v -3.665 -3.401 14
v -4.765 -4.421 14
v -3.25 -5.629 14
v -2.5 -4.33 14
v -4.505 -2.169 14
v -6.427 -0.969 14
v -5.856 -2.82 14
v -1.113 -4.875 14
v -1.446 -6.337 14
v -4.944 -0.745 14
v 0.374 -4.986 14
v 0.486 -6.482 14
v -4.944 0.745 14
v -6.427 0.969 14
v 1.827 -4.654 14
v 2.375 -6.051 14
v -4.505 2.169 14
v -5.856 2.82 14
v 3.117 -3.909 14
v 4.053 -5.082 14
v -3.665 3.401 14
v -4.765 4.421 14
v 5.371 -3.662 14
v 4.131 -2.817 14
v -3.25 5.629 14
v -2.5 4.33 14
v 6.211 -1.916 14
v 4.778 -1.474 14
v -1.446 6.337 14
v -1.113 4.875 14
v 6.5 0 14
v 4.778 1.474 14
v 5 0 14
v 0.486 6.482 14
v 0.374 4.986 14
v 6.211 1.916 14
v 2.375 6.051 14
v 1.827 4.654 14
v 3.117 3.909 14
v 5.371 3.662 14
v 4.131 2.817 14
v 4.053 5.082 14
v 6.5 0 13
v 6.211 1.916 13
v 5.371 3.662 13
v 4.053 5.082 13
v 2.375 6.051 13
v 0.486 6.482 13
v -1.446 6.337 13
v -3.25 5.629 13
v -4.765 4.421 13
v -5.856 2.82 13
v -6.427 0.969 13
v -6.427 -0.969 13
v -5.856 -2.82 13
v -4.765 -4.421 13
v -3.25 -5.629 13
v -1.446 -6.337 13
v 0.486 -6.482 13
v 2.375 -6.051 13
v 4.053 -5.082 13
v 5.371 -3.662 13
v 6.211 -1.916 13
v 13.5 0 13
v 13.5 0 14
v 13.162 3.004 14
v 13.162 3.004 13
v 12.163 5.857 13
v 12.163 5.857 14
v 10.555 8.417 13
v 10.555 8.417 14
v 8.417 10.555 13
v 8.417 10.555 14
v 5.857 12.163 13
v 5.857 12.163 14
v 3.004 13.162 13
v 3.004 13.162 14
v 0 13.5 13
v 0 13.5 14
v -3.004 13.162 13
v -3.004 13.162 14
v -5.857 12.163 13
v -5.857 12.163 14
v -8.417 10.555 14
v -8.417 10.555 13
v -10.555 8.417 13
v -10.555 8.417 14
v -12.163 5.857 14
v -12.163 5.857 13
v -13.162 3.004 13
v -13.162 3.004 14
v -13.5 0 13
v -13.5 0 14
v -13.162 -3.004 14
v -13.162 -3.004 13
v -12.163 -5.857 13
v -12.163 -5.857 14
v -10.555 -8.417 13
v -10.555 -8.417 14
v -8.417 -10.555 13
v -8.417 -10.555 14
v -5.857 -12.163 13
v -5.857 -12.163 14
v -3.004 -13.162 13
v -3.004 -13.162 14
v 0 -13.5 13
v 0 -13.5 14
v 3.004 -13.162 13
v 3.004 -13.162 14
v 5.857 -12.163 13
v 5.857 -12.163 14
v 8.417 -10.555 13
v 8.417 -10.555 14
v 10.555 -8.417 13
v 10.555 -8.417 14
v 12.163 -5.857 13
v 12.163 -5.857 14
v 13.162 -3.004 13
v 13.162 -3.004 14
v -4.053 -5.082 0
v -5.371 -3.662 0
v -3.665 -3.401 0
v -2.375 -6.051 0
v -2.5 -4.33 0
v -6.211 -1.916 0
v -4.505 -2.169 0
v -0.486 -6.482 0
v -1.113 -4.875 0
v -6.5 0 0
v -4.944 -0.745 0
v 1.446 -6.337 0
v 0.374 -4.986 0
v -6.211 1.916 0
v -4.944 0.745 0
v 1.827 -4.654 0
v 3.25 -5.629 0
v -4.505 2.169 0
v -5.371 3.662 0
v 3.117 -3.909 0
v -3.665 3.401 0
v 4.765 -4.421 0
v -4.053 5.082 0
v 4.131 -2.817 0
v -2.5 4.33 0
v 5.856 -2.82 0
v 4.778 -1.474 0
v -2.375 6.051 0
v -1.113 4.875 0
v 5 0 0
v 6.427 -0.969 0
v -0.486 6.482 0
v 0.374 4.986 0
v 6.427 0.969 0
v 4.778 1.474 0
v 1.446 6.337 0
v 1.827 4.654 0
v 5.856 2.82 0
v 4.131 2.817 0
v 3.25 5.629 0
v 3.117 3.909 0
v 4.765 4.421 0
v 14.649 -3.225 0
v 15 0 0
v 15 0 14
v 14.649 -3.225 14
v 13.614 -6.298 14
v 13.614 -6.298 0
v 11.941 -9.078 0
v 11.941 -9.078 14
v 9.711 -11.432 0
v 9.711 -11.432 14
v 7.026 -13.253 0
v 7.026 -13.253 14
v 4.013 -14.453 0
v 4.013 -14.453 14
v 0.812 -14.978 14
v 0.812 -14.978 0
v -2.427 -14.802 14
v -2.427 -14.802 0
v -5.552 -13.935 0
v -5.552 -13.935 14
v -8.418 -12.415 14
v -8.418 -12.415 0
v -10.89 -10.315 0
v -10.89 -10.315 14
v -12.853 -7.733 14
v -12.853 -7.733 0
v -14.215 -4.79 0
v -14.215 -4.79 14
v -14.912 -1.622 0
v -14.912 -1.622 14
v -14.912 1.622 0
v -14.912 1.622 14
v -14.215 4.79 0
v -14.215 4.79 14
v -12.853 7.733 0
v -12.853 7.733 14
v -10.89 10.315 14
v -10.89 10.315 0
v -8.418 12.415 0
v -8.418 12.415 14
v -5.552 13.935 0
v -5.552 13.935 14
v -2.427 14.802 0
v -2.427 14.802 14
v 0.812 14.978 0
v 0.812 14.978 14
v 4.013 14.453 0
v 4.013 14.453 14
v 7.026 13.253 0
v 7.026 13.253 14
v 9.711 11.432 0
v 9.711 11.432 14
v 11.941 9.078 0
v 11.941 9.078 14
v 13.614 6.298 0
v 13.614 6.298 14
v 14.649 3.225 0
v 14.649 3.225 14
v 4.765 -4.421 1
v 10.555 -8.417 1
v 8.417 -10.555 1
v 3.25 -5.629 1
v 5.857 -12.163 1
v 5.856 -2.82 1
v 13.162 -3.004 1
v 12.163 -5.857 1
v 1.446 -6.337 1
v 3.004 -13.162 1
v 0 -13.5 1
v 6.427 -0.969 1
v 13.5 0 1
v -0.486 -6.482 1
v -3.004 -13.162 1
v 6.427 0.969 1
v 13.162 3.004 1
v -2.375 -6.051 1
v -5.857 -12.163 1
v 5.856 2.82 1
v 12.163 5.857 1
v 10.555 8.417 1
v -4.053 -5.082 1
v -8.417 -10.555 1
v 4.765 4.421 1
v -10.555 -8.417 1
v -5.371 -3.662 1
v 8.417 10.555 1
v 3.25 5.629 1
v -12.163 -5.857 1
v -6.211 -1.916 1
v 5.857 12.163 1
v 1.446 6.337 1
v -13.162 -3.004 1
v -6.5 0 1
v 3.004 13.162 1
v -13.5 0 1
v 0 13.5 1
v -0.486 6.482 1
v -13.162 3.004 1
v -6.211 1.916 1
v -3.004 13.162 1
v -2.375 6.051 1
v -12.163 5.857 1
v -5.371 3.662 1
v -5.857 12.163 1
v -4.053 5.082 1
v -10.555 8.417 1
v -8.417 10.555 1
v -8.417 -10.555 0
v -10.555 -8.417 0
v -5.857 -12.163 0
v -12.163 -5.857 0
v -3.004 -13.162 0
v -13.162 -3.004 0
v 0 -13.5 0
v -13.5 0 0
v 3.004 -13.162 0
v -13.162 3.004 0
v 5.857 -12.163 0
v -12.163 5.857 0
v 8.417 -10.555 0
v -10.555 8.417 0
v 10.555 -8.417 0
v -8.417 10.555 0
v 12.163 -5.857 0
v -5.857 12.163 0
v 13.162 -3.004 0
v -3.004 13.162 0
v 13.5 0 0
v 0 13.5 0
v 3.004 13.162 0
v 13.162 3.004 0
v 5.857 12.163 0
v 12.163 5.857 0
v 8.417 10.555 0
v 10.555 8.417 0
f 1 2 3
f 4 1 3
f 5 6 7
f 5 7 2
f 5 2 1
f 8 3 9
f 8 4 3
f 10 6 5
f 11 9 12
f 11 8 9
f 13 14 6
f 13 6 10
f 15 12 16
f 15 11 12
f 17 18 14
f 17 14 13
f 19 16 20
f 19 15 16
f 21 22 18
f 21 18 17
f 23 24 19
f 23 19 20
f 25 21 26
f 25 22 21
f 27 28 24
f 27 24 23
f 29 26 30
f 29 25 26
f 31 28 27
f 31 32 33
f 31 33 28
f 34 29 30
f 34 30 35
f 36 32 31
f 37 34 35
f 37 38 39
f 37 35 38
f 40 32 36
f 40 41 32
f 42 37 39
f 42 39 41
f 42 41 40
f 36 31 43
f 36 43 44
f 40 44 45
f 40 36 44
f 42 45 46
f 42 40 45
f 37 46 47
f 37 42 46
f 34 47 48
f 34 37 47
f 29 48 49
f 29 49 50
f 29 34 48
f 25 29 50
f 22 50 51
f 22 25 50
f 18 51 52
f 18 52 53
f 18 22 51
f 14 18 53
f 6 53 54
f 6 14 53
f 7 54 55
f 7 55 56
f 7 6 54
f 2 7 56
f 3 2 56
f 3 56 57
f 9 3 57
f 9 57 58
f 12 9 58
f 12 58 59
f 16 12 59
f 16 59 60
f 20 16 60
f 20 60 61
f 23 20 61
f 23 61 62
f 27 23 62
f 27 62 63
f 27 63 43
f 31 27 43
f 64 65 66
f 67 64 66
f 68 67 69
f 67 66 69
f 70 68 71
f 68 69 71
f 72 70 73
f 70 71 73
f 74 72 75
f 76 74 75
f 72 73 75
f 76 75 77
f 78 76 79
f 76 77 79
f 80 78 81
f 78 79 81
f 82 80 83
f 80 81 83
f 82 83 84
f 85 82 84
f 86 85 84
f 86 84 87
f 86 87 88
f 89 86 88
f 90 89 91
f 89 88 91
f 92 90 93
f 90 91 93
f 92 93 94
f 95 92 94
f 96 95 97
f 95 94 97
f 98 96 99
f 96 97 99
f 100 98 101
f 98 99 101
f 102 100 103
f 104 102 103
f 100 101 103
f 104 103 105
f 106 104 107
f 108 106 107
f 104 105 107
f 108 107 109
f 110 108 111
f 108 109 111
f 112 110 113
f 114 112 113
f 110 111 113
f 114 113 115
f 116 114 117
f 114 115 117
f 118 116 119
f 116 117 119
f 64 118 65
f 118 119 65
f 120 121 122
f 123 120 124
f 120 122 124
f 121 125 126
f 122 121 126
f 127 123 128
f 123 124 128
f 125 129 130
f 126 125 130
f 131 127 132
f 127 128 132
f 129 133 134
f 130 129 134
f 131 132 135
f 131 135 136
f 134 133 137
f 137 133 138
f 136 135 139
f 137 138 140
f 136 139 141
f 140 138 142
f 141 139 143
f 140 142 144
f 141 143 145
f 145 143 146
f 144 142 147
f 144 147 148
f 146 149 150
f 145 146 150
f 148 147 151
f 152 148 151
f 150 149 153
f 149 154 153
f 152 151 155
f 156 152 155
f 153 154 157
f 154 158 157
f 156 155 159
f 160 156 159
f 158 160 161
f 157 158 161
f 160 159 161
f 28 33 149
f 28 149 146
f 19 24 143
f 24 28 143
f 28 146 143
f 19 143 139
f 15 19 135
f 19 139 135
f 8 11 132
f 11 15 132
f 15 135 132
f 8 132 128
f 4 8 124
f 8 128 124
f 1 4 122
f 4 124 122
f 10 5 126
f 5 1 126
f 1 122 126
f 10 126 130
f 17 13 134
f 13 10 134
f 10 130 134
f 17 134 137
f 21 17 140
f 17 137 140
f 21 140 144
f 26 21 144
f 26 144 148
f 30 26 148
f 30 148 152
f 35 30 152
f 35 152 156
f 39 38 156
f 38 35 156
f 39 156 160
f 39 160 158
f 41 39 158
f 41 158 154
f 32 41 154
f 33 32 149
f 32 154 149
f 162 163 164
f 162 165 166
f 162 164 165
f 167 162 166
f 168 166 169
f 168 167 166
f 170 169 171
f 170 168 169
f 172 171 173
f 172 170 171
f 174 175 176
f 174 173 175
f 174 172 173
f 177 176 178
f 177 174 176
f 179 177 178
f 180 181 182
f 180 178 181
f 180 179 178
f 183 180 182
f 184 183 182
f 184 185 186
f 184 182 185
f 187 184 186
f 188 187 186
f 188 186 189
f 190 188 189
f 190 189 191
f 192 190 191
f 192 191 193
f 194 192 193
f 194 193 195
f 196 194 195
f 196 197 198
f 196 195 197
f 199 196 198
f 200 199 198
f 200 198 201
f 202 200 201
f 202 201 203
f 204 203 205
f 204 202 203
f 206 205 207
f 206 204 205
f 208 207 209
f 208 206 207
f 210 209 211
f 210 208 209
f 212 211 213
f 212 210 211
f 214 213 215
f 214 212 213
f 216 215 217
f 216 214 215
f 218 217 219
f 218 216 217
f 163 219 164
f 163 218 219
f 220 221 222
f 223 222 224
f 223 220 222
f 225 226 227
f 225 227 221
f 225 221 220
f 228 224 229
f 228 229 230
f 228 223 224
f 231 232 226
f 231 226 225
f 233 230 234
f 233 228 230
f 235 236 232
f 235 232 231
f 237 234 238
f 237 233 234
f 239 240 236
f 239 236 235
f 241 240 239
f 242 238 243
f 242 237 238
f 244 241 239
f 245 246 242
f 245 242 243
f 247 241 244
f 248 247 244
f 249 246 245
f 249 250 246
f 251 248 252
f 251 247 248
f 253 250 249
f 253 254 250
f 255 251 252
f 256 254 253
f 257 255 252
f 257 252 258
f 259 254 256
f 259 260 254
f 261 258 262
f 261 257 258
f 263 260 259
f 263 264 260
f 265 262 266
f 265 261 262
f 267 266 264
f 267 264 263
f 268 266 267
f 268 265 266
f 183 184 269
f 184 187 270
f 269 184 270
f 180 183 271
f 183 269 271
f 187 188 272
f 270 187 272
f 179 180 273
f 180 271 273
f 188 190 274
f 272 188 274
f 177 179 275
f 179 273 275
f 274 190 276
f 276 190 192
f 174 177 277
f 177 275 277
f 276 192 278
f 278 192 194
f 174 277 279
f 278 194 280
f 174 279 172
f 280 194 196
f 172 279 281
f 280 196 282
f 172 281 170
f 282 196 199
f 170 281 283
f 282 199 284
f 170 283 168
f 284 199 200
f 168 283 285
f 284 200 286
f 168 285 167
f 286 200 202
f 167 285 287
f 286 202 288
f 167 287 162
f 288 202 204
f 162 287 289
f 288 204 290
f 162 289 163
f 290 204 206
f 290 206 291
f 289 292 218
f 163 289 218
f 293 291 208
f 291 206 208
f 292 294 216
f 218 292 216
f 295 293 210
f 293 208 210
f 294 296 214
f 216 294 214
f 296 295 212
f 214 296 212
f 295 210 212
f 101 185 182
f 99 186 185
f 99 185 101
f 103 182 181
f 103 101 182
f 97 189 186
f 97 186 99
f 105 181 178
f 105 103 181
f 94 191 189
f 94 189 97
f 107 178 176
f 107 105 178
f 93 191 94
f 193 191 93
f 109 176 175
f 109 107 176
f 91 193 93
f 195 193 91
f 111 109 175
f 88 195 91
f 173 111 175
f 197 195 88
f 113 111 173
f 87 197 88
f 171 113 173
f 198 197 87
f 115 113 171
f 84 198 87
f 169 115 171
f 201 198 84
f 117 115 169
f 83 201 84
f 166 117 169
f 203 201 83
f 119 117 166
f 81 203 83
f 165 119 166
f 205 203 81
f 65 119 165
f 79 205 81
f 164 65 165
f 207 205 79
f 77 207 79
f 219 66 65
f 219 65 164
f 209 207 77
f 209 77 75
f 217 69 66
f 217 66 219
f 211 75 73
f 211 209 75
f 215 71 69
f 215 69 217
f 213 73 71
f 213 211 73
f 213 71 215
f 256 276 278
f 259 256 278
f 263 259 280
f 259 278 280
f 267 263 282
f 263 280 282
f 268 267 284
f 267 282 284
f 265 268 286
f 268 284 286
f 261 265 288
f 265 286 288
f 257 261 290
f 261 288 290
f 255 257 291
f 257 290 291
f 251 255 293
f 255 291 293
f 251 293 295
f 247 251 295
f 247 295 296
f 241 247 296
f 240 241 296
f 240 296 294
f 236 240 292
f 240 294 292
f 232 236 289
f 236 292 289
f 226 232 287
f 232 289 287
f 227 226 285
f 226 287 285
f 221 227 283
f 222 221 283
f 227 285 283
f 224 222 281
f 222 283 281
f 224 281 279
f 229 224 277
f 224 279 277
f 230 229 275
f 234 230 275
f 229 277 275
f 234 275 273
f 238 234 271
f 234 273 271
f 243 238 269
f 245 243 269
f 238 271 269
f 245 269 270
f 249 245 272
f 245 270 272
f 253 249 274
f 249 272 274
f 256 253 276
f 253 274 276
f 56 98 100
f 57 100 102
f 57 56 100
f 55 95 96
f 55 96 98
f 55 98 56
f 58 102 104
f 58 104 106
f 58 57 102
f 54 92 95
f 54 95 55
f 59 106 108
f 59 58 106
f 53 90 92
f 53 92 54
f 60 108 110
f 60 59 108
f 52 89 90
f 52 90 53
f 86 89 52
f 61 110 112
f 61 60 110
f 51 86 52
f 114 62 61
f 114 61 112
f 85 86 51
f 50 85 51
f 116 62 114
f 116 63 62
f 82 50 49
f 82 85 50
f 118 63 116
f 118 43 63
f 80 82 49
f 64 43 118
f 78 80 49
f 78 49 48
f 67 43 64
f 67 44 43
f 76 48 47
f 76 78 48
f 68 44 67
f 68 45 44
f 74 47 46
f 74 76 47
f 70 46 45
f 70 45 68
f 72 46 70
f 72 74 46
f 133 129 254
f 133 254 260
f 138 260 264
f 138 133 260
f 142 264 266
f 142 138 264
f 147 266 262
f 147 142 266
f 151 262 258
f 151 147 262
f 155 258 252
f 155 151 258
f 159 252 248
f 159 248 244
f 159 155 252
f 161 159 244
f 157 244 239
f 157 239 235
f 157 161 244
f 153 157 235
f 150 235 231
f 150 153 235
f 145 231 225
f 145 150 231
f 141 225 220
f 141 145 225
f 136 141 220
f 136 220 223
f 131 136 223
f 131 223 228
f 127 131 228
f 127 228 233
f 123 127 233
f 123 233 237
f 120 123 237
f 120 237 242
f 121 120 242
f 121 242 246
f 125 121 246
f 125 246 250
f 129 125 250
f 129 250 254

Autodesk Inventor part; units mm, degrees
ref_plane "YZ Plane" through (0, 0, 0) normal (1, 0, 0) x (0, 1, 0)
ref_plane "XZ Plane" through (0, 0, 0) normal (0, 1, 0) x (-1, 0, 0)
ref_plane "XY Plane" through (0, 0, 0) normal (0, 0, 1) x (1, 0, 0)
sketch "Szkic1" plane through (0, 0, 0) normal (0, 0, 1) x (1, 0, 0)
  circle A0 centre (0, 0) radius 15
  circle A1 centre (0, 0) radius 5
  dimension "d0" = 30
  dimension "d1" = 10
extrude "Wyciągnięcie proste1" add sketch "Szkic1" along normal blind 14
sketch "Szkic2" plane through (0, 0, 14) normal (0, 0, 1) x (1, 0, 0)
  circle A0 centre (0, 0) radius 6.5
  circle A1 centre (0, 0) radius 13.5
  dimension "d4" = 13
  dimension "d5" = 27
extrude "Wyciągnięcie proste2" cut sketch "Szkic2" against normal blind 1
sketch "Szkic3" plane through (0, 0, 0) normal (0, 0, -1) x (-1, 0, 0)
  circle A0 centre (0, 0) radius 6.5
  circle A1 centre (0, 0) radius 13.5
  dimension "d8" = 13
  dimension "d9" = 27
extrude "Wyciągnięcie proste3" cut sketch "Szkic3" against normal blind 1
properties part number "Łożysko kulowe jednorzędowe 3200 2RS"
